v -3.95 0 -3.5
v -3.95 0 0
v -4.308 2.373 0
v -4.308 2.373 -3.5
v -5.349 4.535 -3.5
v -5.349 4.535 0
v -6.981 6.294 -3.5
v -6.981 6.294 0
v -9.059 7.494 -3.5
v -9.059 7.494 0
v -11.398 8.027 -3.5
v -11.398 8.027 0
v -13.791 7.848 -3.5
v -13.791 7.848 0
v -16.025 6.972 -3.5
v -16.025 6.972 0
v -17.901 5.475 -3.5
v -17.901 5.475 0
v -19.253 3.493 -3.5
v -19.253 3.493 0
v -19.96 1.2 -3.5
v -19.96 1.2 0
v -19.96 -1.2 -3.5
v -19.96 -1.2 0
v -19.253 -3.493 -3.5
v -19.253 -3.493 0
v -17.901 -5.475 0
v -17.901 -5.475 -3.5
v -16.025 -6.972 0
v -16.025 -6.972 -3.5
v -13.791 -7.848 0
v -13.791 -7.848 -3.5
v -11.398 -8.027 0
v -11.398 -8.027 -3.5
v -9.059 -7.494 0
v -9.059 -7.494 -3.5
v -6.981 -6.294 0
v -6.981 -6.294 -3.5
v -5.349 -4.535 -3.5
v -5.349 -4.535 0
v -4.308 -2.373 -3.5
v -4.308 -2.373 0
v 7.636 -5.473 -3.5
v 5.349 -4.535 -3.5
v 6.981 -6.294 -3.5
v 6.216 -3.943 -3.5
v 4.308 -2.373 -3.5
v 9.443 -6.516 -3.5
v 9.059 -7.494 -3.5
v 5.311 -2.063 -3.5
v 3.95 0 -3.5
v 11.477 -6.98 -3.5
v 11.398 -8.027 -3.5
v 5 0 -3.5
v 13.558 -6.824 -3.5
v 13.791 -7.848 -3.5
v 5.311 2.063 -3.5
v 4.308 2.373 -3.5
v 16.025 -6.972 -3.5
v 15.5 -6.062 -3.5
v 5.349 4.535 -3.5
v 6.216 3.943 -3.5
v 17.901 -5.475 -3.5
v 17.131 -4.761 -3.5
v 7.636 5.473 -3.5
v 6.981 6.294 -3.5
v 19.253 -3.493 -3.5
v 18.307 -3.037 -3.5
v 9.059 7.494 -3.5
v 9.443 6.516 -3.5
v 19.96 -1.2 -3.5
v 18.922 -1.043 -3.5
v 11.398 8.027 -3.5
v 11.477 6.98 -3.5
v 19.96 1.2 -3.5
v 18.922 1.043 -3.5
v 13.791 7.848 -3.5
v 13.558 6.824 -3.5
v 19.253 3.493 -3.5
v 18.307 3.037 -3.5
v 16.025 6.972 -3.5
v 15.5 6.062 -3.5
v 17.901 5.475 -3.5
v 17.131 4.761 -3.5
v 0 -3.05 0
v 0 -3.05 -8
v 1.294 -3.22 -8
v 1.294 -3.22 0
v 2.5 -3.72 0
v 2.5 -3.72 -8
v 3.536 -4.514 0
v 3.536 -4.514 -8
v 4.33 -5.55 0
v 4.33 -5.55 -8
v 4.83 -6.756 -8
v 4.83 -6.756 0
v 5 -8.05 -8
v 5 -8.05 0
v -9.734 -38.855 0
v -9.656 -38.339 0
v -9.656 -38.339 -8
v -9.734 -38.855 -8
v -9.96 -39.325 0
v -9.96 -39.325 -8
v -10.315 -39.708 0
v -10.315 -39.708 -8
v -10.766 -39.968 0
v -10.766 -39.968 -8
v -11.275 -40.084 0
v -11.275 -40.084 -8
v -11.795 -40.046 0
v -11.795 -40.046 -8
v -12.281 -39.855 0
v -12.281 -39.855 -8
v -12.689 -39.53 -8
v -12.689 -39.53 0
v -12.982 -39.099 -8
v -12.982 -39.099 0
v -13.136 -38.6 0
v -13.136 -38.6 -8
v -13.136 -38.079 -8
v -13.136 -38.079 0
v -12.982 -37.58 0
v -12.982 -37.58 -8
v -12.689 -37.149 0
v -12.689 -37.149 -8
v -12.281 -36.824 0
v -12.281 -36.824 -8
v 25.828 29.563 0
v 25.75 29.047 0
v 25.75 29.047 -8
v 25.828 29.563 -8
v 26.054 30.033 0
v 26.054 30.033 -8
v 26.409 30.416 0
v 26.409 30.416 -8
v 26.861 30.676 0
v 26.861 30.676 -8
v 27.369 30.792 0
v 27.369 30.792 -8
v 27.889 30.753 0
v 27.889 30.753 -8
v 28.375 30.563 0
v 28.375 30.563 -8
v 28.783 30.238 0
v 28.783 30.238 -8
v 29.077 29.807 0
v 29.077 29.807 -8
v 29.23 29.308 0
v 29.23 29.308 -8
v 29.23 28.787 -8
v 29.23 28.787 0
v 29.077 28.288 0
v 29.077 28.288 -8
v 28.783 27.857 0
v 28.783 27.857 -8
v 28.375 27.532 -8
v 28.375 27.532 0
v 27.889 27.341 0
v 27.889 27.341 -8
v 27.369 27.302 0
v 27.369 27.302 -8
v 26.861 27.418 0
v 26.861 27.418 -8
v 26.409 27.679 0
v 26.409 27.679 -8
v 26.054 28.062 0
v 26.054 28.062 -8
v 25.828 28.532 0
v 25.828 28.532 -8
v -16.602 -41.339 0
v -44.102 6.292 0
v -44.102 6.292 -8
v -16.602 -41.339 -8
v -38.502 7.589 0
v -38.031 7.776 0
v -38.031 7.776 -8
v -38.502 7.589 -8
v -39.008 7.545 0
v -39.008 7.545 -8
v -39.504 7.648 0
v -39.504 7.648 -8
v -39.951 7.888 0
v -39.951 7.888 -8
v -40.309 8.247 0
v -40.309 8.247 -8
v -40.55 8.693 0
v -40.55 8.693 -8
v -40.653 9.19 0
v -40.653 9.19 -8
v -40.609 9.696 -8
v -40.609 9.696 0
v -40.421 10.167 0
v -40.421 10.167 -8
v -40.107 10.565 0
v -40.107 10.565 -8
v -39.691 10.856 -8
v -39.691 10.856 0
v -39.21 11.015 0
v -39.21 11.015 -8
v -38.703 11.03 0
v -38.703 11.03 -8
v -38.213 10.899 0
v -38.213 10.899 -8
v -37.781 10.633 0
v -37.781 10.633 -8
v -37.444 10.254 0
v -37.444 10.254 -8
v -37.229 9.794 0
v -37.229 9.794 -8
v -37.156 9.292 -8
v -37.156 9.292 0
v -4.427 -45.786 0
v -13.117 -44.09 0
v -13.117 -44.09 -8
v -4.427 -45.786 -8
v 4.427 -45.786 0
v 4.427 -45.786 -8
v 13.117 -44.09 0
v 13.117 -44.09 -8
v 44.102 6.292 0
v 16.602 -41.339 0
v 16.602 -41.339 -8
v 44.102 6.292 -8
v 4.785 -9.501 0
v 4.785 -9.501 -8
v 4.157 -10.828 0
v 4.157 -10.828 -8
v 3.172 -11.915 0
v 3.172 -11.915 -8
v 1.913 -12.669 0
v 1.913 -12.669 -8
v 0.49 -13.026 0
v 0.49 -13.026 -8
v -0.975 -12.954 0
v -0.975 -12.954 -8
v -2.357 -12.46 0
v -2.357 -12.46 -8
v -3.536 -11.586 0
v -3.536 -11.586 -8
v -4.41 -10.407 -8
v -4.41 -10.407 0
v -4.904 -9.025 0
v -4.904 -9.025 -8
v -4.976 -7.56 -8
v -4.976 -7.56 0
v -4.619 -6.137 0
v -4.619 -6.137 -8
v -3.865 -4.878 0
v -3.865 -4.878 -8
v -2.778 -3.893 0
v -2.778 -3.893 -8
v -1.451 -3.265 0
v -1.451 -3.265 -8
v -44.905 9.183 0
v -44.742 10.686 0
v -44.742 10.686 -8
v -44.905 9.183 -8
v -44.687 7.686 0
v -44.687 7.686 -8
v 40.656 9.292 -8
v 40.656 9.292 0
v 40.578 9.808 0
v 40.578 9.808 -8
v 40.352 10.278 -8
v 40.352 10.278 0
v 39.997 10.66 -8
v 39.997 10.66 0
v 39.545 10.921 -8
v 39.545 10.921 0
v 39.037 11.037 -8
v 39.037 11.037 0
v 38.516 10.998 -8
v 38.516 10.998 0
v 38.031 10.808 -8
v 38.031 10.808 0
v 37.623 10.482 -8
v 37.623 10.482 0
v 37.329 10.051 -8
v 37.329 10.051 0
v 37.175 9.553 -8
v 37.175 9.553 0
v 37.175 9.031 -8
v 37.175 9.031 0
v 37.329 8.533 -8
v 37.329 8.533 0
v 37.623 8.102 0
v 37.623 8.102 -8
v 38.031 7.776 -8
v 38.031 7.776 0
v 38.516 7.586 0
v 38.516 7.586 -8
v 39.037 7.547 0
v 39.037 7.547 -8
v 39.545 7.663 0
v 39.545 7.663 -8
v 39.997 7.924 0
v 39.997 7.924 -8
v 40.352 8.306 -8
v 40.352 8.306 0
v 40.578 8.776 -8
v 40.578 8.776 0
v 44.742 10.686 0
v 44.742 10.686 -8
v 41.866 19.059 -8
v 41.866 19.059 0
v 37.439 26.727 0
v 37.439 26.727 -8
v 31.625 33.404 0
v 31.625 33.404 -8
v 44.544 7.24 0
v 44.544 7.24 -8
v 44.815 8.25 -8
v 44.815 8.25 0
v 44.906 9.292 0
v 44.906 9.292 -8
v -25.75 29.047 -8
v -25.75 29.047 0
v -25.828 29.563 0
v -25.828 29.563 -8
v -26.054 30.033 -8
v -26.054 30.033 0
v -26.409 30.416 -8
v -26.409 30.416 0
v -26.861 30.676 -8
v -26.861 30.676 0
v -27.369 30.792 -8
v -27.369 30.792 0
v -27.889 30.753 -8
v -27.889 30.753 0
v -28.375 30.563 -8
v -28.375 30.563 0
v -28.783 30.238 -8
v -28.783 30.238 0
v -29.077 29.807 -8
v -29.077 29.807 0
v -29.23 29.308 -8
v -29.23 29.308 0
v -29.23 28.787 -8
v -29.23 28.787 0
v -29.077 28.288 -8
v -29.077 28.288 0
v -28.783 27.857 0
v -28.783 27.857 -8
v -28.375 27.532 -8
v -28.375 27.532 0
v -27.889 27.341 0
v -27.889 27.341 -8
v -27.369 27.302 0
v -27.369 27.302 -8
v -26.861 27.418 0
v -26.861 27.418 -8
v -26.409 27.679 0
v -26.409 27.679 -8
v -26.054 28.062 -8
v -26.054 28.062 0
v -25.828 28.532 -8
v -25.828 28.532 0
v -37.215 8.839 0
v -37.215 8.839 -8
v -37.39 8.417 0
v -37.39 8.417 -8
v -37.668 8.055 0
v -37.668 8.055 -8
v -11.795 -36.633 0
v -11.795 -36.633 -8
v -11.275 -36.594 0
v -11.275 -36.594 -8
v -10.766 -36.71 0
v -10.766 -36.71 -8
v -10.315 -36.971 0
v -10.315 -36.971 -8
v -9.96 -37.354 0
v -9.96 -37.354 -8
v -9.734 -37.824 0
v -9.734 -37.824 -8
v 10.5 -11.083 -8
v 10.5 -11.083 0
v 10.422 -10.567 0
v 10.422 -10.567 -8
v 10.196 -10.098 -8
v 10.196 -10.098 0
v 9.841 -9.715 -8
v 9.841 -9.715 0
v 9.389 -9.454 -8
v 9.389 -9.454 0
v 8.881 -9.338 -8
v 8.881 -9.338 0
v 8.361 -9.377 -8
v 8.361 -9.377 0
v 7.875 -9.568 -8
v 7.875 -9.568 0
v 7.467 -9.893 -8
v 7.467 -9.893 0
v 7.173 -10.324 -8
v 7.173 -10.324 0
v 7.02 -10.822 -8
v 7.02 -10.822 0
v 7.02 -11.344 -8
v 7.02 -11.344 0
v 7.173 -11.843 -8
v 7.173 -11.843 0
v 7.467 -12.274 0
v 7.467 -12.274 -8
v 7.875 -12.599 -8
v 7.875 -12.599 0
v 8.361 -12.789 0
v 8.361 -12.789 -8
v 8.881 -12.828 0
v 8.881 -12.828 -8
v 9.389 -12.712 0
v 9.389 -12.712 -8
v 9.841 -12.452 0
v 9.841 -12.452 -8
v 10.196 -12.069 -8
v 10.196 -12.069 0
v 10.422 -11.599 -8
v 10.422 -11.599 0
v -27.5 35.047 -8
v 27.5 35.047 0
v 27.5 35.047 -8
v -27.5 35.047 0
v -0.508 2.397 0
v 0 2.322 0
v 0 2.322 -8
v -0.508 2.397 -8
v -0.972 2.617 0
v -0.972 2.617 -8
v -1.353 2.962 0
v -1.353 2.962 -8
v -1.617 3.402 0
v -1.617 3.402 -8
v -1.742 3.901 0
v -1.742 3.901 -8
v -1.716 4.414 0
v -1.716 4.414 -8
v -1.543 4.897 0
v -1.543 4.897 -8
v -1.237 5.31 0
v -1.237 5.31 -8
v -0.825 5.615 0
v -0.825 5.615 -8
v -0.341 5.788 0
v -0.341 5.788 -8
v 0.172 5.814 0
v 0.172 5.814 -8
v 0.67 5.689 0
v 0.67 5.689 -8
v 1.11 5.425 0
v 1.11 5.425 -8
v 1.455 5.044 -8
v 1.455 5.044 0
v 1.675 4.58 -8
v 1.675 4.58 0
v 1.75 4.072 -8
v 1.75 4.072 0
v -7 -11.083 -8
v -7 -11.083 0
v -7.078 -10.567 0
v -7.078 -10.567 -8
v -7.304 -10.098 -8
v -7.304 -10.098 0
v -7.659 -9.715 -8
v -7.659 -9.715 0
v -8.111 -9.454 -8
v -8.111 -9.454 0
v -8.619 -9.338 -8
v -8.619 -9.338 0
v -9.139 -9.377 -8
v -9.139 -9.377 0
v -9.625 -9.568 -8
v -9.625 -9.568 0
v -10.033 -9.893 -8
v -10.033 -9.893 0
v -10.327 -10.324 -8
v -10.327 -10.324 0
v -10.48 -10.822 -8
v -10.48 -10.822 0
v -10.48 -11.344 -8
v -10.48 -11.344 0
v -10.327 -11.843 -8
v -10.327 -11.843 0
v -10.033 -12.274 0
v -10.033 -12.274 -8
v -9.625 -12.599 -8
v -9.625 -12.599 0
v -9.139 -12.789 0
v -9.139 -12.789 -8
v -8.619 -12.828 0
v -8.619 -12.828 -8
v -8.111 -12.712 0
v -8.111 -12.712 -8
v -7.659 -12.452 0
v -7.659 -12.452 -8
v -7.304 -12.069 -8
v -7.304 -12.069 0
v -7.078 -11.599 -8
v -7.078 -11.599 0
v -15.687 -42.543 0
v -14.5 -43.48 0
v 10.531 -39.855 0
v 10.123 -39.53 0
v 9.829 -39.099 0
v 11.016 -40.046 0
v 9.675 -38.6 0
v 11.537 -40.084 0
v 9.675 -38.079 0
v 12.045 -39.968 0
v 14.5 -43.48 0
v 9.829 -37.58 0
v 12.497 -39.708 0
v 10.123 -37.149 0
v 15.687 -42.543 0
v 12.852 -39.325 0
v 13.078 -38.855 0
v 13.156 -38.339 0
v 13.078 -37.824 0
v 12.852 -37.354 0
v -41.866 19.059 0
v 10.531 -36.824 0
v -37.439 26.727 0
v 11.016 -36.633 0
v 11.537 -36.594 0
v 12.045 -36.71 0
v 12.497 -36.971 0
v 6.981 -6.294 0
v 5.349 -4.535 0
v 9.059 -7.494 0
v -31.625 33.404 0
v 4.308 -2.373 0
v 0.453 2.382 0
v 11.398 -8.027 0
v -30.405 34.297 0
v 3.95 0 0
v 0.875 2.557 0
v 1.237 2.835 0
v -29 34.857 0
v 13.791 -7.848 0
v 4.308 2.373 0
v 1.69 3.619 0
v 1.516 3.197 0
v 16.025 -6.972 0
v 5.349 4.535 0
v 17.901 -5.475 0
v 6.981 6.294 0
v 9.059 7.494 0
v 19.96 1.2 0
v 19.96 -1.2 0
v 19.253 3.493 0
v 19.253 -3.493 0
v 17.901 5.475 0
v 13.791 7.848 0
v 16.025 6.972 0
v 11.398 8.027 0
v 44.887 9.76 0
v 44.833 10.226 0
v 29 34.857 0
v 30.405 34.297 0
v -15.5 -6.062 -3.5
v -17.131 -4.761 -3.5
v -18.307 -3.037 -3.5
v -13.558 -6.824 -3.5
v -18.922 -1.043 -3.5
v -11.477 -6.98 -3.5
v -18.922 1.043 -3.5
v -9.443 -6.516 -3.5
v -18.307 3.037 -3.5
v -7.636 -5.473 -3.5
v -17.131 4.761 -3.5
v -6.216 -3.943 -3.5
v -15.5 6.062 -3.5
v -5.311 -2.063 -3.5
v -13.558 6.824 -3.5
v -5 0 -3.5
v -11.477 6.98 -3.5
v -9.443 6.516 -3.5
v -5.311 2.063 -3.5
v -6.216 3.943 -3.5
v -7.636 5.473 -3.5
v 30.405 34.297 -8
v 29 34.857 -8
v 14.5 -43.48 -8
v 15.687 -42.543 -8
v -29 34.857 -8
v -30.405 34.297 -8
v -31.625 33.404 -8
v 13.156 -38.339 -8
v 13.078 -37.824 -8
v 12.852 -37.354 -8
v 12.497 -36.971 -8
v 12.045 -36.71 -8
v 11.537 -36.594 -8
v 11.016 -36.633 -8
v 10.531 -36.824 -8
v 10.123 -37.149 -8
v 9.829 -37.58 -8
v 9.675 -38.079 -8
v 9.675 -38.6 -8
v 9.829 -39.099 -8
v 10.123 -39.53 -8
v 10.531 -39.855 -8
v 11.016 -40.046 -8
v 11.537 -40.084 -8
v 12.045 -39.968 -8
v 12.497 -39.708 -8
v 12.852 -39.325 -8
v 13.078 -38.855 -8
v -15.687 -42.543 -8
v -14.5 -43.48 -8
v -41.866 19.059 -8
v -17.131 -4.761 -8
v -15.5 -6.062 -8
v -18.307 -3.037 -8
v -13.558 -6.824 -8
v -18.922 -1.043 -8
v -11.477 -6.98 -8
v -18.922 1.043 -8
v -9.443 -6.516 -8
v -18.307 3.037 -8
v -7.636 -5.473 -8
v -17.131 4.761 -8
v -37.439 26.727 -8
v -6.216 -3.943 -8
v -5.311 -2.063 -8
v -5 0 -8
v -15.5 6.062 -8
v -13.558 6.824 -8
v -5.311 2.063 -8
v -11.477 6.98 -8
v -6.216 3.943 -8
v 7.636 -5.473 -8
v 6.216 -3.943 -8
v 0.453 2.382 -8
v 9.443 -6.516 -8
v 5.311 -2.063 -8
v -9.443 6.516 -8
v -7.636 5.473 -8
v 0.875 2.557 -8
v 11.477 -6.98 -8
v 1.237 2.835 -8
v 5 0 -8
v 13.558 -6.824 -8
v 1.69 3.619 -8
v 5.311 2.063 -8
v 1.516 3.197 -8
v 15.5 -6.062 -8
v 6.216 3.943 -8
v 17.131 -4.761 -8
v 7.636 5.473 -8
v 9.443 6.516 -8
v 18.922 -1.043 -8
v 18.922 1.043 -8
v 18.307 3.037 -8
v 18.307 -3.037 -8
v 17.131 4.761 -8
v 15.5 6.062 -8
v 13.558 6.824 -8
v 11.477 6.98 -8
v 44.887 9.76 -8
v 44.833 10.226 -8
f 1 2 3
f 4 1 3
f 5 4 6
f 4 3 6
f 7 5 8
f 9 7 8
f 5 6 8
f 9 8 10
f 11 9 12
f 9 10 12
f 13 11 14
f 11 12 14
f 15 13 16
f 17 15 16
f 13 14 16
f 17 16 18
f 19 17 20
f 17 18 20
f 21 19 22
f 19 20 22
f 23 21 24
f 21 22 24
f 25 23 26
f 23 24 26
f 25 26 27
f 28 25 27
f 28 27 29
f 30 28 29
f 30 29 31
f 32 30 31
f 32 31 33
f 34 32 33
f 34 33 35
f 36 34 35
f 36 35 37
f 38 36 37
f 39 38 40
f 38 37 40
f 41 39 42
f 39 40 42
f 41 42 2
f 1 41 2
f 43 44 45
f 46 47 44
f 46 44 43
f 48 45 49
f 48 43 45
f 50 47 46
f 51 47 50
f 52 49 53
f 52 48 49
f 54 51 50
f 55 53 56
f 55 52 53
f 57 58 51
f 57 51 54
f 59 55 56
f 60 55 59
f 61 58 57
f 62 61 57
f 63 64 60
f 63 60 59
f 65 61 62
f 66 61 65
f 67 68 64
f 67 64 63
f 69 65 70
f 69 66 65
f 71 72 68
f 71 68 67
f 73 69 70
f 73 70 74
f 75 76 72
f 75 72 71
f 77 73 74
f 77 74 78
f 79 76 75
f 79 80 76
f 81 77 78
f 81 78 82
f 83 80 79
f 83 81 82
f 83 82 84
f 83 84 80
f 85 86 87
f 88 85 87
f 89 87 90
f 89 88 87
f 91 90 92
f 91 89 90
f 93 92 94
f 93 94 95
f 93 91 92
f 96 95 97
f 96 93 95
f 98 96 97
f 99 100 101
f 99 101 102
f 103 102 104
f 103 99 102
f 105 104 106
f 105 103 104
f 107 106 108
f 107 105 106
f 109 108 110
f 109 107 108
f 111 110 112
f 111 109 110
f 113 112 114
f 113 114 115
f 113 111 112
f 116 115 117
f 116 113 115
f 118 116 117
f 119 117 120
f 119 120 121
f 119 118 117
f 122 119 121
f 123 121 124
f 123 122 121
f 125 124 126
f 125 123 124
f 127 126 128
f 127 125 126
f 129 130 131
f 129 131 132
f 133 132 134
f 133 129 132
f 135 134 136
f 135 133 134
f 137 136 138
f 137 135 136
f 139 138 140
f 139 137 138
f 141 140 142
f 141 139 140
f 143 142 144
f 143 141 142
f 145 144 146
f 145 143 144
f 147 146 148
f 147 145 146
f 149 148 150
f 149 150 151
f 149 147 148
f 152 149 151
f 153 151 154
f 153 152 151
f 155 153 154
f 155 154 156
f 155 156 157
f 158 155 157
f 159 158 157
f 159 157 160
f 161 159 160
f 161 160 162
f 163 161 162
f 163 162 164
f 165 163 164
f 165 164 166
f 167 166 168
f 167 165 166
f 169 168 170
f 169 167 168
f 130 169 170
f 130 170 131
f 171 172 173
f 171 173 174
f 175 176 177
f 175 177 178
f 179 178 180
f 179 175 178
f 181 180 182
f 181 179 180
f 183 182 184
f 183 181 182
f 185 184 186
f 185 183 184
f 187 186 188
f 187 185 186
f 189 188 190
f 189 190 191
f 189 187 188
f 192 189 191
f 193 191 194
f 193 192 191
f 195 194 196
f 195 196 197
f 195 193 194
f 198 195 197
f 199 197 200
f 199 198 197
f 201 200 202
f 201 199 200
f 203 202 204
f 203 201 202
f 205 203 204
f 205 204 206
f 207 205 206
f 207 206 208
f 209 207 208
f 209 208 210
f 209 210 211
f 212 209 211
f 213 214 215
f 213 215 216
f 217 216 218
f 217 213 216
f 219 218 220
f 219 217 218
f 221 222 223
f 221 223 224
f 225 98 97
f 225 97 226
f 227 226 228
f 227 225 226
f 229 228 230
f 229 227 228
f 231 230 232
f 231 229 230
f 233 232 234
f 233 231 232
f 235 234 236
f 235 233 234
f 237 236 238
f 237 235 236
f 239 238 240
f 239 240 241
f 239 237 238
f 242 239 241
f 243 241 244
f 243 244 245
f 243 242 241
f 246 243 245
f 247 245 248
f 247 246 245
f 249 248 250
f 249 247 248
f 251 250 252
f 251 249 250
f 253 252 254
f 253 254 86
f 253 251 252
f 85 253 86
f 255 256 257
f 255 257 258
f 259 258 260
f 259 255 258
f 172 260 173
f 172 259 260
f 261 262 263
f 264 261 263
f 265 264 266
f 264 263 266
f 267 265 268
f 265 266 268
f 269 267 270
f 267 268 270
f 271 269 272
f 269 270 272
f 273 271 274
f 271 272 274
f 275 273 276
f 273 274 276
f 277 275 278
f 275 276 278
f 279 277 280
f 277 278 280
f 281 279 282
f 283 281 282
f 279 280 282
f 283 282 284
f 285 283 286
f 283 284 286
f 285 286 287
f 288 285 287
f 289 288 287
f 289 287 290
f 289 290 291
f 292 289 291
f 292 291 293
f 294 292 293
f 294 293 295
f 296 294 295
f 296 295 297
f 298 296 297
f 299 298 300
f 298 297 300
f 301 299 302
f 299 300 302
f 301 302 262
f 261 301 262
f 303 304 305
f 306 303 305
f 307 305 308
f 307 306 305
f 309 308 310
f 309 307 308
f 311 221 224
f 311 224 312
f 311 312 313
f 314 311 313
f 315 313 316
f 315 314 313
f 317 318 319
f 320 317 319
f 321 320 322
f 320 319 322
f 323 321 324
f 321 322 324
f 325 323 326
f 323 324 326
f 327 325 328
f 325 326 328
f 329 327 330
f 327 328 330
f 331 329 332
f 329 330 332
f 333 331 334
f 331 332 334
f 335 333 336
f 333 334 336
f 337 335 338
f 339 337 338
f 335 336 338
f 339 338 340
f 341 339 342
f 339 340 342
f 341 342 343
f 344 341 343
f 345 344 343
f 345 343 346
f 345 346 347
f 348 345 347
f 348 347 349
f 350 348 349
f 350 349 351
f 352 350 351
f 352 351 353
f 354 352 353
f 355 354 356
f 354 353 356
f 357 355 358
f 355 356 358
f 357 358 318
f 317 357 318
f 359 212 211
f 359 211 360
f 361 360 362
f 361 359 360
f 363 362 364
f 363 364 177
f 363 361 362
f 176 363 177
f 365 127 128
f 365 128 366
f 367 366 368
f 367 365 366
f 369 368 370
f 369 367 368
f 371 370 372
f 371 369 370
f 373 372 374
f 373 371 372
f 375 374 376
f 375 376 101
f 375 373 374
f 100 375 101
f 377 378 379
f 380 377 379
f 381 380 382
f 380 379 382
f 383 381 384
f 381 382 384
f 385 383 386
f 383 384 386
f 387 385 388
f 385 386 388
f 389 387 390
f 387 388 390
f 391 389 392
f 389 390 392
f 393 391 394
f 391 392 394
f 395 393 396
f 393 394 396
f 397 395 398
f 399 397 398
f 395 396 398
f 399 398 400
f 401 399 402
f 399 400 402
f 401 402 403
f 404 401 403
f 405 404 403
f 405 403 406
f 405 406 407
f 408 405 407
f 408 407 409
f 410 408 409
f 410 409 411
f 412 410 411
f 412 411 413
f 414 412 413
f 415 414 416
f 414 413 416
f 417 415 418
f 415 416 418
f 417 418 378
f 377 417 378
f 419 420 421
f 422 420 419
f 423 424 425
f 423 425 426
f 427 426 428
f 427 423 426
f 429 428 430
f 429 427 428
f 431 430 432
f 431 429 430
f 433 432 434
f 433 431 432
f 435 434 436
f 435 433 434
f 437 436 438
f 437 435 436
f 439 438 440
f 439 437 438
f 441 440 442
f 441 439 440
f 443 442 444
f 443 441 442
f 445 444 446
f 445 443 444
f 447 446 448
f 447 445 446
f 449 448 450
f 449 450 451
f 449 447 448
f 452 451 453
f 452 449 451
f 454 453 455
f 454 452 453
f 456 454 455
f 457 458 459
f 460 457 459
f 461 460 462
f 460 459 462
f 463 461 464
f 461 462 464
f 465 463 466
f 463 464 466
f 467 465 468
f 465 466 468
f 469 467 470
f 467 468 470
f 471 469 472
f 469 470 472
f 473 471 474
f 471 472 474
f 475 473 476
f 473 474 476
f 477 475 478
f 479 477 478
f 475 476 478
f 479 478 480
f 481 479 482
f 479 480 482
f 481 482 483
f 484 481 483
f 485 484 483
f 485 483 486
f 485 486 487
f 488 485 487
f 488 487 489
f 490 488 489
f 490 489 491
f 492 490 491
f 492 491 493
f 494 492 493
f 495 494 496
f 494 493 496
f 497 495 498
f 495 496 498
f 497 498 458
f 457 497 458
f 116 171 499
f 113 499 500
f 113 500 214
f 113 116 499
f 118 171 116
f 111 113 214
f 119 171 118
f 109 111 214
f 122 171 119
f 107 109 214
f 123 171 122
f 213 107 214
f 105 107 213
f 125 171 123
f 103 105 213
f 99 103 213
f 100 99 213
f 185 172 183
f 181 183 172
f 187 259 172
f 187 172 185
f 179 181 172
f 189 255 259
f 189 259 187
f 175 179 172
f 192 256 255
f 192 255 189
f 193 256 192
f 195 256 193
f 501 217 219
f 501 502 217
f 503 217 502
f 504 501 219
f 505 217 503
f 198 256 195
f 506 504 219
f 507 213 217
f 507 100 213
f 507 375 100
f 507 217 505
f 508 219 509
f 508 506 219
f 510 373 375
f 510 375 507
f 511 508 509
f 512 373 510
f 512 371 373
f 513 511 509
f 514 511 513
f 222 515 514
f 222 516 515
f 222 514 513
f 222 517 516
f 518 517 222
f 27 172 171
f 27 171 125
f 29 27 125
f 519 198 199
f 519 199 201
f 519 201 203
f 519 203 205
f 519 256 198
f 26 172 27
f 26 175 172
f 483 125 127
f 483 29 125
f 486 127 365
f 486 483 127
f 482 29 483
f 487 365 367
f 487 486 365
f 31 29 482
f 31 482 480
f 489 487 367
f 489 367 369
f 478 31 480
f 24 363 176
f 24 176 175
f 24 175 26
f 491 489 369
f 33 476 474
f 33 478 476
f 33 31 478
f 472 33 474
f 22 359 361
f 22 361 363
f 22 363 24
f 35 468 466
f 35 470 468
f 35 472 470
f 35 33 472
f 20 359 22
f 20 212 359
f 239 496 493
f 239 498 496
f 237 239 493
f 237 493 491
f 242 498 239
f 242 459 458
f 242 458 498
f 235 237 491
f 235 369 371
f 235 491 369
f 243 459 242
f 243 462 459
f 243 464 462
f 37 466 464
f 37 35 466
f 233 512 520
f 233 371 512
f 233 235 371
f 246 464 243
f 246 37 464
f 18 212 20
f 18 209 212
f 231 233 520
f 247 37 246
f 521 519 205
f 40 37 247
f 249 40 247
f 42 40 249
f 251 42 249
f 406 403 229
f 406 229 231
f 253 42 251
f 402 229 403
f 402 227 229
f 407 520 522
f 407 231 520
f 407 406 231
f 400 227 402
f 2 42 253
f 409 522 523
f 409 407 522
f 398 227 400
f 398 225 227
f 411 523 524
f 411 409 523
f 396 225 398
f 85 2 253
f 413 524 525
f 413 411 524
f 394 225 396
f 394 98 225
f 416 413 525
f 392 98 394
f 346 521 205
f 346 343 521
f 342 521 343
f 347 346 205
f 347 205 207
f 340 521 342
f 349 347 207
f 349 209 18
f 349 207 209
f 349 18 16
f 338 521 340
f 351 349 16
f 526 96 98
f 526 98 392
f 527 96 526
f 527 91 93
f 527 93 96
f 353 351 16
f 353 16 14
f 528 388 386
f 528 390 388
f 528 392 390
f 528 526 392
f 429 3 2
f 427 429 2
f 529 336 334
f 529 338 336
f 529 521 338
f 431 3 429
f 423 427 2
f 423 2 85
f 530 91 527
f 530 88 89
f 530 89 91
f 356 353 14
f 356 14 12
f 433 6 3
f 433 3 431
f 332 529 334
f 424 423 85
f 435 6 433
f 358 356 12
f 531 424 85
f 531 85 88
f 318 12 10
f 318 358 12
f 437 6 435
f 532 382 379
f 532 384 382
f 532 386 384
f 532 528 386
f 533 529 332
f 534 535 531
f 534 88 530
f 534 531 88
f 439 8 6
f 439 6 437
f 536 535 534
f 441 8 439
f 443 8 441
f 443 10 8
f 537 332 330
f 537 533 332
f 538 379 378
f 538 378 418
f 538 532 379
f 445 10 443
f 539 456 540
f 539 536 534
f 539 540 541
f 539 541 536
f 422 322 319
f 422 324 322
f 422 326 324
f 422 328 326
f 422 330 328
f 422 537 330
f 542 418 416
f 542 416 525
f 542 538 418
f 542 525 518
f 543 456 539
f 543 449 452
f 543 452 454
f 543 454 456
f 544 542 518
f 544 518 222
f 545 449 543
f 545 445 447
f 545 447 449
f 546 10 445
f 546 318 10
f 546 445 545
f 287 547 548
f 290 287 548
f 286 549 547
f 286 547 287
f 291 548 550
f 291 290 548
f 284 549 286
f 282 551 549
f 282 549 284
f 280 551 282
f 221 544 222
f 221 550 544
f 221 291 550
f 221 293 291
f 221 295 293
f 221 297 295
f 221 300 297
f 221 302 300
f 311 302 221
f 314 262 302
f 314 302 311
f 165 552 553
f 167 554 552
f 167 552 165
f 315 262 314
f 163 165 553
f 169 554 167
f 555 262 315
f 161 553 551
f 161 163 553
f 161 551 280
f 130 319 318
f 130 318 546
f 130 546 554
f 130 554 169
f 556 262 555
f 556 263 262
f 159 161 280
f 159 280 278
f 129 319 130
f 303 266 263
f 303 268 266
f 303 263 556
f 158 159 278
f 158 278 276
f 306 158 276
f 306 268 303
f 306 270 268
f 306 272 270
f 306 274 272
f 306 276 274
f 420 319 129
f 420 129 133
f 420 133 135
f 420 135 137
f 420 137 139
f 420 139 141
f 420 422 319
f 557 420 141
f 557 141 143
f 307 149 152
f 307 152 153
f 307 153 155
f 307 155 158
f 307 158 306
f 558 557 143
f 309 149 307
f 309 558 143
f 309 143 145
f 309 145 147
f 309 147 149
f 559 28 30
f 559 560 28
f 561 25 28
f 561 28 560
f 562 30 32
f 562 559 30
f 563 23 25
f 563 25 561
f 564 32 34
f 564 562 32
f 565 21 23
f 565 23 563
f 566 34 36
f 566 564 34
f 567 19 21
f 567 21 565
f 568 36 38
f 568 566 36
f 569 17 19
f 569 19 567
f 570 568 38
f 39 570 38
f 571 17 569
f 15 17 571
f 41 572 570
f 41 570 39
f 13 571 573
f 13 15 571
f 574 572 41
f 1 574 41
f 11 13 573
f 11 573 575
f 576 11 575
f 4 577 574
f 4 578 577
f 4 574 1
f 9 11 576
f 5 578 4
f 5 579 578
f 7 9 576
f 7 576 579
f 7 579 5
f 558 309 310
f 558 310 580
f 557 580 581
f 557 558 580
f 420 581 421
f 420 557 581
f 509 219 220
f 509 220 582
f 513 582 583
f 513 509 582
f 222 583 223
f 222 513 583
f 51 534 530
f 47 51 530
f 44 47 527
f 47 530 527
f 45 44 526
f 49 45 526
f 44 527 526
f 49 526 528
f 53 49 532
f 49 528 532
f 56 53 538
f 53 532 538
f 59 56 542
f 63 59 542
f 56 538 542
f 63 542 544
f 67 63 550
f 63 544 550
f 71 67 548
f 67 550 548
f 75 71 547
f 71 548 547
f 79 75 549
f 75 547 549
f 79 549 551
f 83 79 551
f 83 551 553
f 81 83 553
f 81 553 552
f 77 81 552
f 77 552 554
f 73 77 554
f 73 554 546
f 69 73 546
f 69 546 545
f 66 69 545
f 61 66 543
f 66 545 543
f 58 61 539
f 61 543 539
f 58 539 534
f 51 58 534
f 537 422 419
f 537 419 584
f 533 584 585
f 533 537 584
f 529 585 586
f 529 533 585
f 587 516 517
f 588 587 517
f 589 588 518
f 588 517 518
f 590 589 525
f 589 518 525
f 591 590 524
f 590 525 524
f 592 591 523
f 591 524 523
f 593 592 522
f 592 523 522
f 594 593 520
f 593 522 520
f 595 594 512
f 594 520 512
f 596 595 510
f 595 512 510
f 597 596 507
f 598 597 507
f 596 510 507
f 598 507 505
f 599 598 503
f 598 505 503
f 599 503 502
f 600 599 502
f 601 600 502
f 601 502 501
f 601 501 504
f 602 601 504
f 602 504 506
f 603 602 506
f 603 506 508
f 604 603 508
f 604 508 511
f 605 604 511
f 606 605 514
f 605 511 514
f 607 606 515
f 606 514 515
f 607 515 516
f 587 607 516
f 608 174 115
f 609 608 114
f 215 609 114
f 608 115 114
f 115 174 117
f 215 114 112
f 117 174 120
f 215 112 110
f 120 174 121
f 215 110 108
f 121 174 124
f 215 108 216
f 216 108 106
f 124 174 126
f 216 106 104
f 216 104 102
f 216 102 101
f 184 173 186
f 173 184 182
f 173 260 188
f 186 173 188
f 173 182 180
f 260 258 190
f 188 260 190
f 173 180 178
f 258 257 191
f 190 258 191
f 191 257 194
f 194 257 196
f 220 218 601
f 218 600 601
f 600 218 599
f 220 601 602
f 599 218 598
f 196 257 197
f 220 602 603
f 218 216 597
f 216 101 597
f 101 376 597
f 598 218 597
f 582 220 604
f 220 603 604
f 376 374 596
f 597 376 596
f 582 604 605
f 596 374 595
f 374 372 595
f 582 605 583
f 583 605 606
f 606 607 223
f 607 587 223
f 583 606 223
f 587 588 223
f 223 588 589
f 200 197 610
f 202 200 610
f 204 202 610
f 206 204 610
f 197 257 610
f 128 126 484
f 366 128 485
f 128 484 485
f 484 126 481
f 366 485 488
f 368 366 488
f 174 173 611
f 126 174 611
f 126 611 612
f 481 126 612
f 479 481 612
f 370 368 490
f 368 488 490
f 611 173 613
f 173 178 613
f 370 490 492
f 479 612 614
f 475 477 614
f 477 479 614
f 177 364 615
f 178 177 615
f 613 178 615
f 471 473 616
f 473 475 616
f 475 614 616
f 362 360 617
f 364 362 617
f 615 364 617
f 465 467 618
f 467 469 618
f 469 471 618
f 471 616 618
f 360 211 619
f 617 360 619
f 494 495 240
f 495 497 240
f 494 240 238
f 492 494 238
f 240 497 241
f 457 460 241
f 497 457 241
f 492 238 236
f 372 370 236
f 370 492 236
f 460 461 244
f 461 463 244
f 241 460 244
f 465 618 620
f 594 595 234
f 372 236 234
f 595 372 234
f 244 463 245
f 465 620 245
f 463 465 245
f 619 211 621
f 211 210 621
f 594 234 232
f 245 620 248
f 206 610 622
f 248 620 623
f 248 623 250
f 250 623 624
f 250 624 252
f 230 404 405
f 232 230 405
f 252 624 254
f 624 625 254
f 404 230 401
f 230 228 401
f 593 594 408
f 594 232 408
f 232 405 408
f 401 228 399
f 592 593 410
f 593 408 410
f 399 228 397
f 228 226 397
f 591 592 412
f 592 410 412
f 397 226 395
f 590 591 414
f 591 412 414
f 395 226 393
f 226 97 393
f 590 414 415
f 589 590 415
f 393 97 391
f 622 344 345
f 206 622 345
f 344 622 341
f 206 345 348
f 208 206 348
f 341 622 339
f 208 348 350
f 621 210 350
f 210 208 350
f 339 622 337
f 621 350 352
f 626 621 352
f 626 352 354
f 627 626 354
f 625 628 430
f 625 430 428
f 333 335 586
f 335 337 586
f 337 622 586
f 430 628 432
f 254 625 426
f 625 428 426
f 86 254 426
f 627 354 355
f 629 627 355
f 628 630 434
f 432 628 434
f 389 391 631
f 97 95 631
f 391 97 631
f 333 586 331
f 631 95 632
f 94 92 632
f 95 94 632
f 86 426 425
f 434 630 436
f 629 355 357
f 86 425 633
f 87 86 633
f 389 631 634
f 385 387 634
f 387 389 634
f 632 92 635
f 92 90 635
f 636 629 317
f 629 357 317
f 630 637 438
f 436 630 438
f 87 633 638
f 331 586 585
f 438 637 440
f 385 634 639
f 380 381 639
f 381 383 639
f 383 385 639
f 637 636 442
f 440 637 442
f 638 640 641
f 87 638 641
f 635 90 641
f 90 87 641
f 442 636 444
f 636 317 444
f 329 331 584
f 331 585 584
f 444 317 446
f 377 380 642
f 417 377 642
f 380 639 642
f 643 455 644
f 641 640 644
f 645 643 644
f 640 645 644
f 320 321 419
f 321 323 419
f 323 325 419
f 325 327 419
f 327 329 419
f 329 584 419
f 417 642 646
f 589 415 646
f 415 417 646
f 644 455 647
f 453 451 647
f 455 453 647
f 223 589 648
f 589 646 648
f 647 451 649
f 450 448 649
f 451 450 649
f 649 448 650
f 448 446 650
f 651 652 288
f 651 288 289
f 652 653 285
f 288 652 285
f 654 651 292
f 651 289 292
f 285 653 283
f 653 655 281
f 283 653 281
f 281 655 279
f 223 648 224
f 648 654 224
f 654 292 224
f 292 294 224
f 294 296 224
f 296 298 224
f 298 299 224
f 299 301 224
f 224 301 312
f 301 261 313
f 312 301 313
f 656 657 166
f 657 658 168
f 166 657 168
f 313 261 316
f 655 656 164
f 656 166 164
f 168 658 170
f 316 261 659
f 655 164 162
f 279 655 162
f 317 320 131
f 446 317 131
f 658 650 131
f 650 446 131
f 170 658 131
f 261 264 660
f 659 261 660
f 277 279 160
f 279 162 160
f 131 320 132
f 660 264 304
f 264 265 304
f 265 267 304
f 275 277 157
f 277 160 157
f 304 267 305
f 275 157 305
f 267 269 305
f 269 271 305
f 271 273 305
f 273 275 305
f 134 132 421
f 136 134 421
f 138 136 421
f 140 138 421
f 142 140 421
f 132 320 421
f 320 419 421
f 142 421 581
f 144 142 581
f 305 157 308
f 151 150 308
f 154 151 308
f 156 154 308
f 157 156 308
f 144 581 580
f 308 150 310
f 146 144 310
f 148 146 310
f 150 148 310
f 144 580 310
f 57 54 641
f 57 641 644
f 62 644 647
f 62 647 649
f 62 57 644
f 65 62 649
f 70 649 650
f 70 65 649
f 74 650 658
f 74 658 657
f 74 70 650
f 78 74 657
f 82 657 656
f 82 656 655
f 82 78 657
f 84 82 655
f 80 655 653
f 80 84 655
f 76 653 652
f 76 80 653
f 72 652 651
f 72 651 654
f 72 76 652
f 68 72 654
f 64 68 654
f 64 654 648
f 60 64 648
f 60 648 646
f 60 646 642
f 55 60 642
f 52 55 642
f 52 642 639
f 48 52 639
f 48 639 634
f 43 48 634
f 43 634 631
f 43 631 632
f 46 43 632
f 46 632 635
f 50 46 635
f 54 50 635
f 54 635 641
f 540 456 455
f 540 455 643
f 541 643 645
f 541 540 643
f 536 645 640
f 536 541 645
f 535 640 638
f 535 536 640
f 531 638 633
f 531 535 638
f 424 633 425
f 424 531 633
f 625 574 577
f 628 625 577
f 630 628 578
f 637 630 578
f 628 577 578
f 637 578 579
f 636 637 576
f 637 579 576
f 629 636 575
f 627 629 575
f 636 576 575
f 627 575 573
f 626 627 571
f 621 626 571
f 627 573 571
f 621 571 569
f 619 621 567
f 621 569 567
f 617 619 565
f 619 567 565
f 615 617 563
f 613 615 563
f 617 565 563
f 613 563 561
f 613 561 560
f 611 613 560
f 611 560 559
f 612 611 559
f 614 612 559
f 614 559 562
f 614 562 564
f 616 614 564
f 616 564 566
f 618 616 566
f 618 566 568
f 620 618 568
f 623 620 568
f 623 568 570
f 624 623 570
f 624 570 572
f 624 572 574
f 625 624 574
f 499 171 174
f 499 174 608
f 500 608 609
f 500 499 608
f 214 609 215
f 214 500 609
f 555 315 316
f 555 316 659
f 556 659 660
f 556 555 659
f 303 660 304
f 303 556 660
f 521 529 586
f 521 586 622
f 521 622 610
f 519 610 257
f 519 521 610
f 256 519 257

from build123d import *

# Parameters (mm, degrees)
F0_R     = 1.75
F0_R_2   = 8.05
F0_R_3   = 7
F1_DEPTH = 8
F2_DEPTH = 3.5


with BuildPart() as f1:
    # F0 (on Top) → F1 (new body)
    with BuildSketch(Plane.XY):
        with BuildLine():
            ThreePointArc((-32.905765, 9.292011), (-33.709612, 6.292011), (-35.905765, 4.095859))
            Line((-35.905765, 4.095859), (-14.405765, -33.143234))
            ThreePointArc((-14.405765, -33.143234), (-8.405765, -33.143234), (-5.405765, -38.339386))
            ThreePointArc((-5.405765, -38.339386), (-7.818648, -43.149022), (-13.11663, -44.090294))
            ThreePointArc((-13.11663, -44.090294), (0, -46), (13.116629, -44.090294))
            ThreePointArc((13.116629, -44.090294), (6.596129, -34.752269), (17.405765, -38.339386))
            ThreePointArc((17.405765, -38.339386), (17.20132, -39.8923), (16.601917, -41.339386))
            Line((16.601917, -41.339386), (44.101917, 6.292011))
            ThreePointArc((44.101917, 6.292011), (32.968364, 10.156462), (44.741629, 10.685813))
            ThreePointArc((44.741629, 10.685813), (39.837169, 23), (31.625, 33.404481))
            ThreePointArc((31.625, 33.404481), (33.011352, 31.419083), (33.5, 29.047375))
            ThreePointArc((33.5, 29.047375), (27.5, 23.047375), (21.5, 29.047375))
            Line((21.5, 29.047375), (-21.5, 29.047375))
            ThreePointArc((-21.5, 29.047375), (-29.871708, 23.536023), (-31.625, 33.404481))
            ThreePointArc((-31.625, 33.404481), (-39.837169, 23), (-44.741629, 10.685813))
            ThreePointArc((-44.741629, 10.685813), (-38.204048, 15.250836), (-32.905765, 9.292011))
        make_face()
        with Locations((-8.75, -11.083321)):
            Circle(F0_R, mode=Mode.SUBTRACT)
        with BuildLine():
            ThreePointArc((5, -8.05), (-3.535534, -11.585534), (0, -3.05))
            ThreePointArc((0, -3.05), (3.535534, -4.514466), (5, -8.05))
        make_face(mode=Mode.SUBTRACT)
        with Locations((8.75, -11.083321)):
            Circle(F0_R, mode=Mode.SUBTRACT)
        with Locations((-12, 0)):
            Circle(F0_R_2, mode=Mode.SUBTRACT)
        with BuildLine():
            ThreePointArc((1.75, 4.072124), (1.237437, 2.834687), (0, 2.322124))
            ThreePointArc((0, 2.322124), (-1.237437, 5.309561), (1.75, 4.072124))
        make_face(mode=Mode.SUBTRACT)
        with BuildLine():
            ThreePointArc((20.05, 0), (12, -8.05), (3.95, 0))
            ThreePointArc((3.95, 0), (12, 8.05), (20.05, 0))
        make_face(mode=Mode.SUBTRACT)
        with BuildLine():
            Line((-14.405765, -33.143234), (-35.905765, 4.095859))
            ThreePointArc((-35.905765, 4.095859), (-40.458679, 3.496456), (-44.101917, 6.292011))
            Line((-44.101917, 6.292011), (-16.601917, -41.339386))
            ThreePointArc((-16.601917, -41.339386), (-17.20132, -36.786472), (-14.405765, -33.143234))
        make_face()
        with BuildLine():
            ThreePointArc((-44.101917, 6.292011), (-40.458679, 3.496456), (-35.905765, 4.095859))
            ThreePointArc((-35.905765, 4.095859), (-33.709612, 6.292011), (-32.905765, 9.292011))
            ThreePointArc((-32.905765, 9.292011), (-38.204048, 15.250836), (-44.741629, 10.685813))
            ThreePointArc((-44.741629, 10.685813), (-44.843165, 8.42756), (-44.101917, 6.292011))
        make_face()
        with BuildLine():
            ThreePointArc((-38.030765, 7.776467), (-40.421309, 10.167011), (-37.155765, 9.292011))
            ThreePointArc((-37.155765, 9.292011), (-37.39022, 8.417011), (-38.030765, 7.776467))
        make_face(mode=Mode.SUBTRACT)
        with BuildLine():
            ThreePointArc((-27.5, 35.047375), (-29.720063, 34.62154), (-31.625, 33.404481))
            ThreePointArc((-31.625, 33.404481), (-29.871708, 23.536023), (-21.5, 29.047375))
            ThreePointArc((-21.5, 29.047375), (-23.257359, 33.290016), (-27.5, 35.047375))
        make_face()
        with Locations((-27.5, 29.047375)):
            Circle(F0_R, mode=Mode.SUBTRACT)
        with BuildLine():
            Line((27.5, 35.047375), (-27.5, 35.047375))
            ThreePointArc((-27.5, 35.047375), (-23.257359, 33.290016), (-21.5, 29.047375))
            Line((-21.5, 29.047375), (21.5, 29.047375))
            ThreePointArc((21.5, 29.047375), (23.257359, 33.290016), (27.5, 35.047375))
        make_face()
        with BuildLine():
            ThreePointArc((33.5, 29.047375), (33.011352, 31.419083), (31.625, 33.404481))
            ThreePointArc((31.625, 33.404481), (29.720063, 34.62154), (27.5, 35.047375))
            ThreePointArc((27.5, 35.047375), (23.257359, 33.290016), (21.5, 29.047375))
            ThreePointArc((21.5, 29.047375), (27.5, 23.047375), (33.5, 29.047375))
        make_face()
        with BuildLine():
            ThreePointArc((29.25, 29.047375), (27.5, 27.297375), (25.75, 29.047375))
            ThreePointArc((25.75, 29.047375), (27.5, 30.797375), (29.25, 29.047375))
        make_face(mode=Mode.SUBTRACT)
        with BuildLine():
            ThreePointArc((44.905765, 9.292011), (44.86459, 9.993728), (44.741629, 10.685813))
            ThreePointArc((44.741629, 10.685813), (32.968364, 10.156462), (44.101917, 6.292011))
            ThreePointArc((44.101917, 6.292011), (44.70132, 7.739097), (44.905765, 9.292011))
        make_face()
        with Locations((38.905765, 9.292011)):
            Circle(F0_R, mode=Mode.SUBTRACT)
        with BuildLine():
            ThreePointArc((17.405765, -38.339386), (6.596129, -34.752269), (13.116629, -44.090294))
            ThreePointArc((13.116629, -44.090294), (15.123102, -43.0491), (16.601917, -41.339386))
            ThreePointArc((16.601917, -41.339386), (17.20132, -39.8923), (17.405765, -38.339386))
        make_face()
        with Locations((11.405765, -38.339386)):
            Circle(F0_R, mode=Mode.SUBTRACT)
        with BuildLine():
            ThreePointArc((-5.405765, -38.339386), (-8.405765, -33.143234), (-14.405765, -33.143234))
            ThreePointArc((-14.405765, -33.143234), (-17.20132, -36.786472), (-16.601917, -41.339386))
            ThreePointArc((-16.601917, -41.339386), (-15.123102, -43.0491), (-13.11663, -44.090294))
            ThreePointArc((-13.11663, -44.090294), (-7.818648, -43.149022), (-5.405765, -38.339386))
        make_face()
        with BuildLine():
            ThreePointArc((-9.655765, -38.339386), (-12.280765, -39.854931), (-12.280765, -36.823842))
            ThreePointArc((-12.280765, -36.823842), (-10.530765, -36.823842), (-9.655765, -38.339386))
        make_face(mode=Mode.SUBTRACT)
        with Locations((-12, 0)):
            Circle(F0_R_2)
        with Locations((-12, 0)):
            Circle(F0_R_3, mode=Mode.SUBTRACT)
        with BuildLine():
            ThreePointArc((20.05, 0), (12, 8.05), (3.95, 0))
            ThreePointArc((3.95, 0), (12, -8.05), (20.05, 0))
        make_face()
        with BuildLine():
            ThreePointArc((19, 0), (12, -7), (5, 0))
            ThreePointArc((5, 0), (12, 7), (19, 0))
        make_face(mode=Mode.SUBTRACT)
    extrude(amount=-F1_DEPTH)

    # F0 (on Top) → F2 (cut)
    with BuildSketch(Plane.XY):
        with BuildLine():
            ThreePointArc((20.05, 0), (12, 8.05), (3.95, 0))
            ThreePointArc((3.95, 0), (12, -8.05), (20.05, 0))
        make_face()
        with BuildLine():
            ThreePointArc((19, 0), (12, -7), (5, 0))
            ThreePointArc((5, 0), (12, 7), (19, 0))
        make_face(mode=Mode.SUBTRACT)
        with Locations((-12, 0)):
            Circle(F0_R_2)
        with Locations((-12, 0)):
            Circle(F0_R_3, mode=Mode.SUBTRACT)
    extrude(amount=-F2_DEPTH, mode=Mode.SUBTRACT)


solid = f1.part
